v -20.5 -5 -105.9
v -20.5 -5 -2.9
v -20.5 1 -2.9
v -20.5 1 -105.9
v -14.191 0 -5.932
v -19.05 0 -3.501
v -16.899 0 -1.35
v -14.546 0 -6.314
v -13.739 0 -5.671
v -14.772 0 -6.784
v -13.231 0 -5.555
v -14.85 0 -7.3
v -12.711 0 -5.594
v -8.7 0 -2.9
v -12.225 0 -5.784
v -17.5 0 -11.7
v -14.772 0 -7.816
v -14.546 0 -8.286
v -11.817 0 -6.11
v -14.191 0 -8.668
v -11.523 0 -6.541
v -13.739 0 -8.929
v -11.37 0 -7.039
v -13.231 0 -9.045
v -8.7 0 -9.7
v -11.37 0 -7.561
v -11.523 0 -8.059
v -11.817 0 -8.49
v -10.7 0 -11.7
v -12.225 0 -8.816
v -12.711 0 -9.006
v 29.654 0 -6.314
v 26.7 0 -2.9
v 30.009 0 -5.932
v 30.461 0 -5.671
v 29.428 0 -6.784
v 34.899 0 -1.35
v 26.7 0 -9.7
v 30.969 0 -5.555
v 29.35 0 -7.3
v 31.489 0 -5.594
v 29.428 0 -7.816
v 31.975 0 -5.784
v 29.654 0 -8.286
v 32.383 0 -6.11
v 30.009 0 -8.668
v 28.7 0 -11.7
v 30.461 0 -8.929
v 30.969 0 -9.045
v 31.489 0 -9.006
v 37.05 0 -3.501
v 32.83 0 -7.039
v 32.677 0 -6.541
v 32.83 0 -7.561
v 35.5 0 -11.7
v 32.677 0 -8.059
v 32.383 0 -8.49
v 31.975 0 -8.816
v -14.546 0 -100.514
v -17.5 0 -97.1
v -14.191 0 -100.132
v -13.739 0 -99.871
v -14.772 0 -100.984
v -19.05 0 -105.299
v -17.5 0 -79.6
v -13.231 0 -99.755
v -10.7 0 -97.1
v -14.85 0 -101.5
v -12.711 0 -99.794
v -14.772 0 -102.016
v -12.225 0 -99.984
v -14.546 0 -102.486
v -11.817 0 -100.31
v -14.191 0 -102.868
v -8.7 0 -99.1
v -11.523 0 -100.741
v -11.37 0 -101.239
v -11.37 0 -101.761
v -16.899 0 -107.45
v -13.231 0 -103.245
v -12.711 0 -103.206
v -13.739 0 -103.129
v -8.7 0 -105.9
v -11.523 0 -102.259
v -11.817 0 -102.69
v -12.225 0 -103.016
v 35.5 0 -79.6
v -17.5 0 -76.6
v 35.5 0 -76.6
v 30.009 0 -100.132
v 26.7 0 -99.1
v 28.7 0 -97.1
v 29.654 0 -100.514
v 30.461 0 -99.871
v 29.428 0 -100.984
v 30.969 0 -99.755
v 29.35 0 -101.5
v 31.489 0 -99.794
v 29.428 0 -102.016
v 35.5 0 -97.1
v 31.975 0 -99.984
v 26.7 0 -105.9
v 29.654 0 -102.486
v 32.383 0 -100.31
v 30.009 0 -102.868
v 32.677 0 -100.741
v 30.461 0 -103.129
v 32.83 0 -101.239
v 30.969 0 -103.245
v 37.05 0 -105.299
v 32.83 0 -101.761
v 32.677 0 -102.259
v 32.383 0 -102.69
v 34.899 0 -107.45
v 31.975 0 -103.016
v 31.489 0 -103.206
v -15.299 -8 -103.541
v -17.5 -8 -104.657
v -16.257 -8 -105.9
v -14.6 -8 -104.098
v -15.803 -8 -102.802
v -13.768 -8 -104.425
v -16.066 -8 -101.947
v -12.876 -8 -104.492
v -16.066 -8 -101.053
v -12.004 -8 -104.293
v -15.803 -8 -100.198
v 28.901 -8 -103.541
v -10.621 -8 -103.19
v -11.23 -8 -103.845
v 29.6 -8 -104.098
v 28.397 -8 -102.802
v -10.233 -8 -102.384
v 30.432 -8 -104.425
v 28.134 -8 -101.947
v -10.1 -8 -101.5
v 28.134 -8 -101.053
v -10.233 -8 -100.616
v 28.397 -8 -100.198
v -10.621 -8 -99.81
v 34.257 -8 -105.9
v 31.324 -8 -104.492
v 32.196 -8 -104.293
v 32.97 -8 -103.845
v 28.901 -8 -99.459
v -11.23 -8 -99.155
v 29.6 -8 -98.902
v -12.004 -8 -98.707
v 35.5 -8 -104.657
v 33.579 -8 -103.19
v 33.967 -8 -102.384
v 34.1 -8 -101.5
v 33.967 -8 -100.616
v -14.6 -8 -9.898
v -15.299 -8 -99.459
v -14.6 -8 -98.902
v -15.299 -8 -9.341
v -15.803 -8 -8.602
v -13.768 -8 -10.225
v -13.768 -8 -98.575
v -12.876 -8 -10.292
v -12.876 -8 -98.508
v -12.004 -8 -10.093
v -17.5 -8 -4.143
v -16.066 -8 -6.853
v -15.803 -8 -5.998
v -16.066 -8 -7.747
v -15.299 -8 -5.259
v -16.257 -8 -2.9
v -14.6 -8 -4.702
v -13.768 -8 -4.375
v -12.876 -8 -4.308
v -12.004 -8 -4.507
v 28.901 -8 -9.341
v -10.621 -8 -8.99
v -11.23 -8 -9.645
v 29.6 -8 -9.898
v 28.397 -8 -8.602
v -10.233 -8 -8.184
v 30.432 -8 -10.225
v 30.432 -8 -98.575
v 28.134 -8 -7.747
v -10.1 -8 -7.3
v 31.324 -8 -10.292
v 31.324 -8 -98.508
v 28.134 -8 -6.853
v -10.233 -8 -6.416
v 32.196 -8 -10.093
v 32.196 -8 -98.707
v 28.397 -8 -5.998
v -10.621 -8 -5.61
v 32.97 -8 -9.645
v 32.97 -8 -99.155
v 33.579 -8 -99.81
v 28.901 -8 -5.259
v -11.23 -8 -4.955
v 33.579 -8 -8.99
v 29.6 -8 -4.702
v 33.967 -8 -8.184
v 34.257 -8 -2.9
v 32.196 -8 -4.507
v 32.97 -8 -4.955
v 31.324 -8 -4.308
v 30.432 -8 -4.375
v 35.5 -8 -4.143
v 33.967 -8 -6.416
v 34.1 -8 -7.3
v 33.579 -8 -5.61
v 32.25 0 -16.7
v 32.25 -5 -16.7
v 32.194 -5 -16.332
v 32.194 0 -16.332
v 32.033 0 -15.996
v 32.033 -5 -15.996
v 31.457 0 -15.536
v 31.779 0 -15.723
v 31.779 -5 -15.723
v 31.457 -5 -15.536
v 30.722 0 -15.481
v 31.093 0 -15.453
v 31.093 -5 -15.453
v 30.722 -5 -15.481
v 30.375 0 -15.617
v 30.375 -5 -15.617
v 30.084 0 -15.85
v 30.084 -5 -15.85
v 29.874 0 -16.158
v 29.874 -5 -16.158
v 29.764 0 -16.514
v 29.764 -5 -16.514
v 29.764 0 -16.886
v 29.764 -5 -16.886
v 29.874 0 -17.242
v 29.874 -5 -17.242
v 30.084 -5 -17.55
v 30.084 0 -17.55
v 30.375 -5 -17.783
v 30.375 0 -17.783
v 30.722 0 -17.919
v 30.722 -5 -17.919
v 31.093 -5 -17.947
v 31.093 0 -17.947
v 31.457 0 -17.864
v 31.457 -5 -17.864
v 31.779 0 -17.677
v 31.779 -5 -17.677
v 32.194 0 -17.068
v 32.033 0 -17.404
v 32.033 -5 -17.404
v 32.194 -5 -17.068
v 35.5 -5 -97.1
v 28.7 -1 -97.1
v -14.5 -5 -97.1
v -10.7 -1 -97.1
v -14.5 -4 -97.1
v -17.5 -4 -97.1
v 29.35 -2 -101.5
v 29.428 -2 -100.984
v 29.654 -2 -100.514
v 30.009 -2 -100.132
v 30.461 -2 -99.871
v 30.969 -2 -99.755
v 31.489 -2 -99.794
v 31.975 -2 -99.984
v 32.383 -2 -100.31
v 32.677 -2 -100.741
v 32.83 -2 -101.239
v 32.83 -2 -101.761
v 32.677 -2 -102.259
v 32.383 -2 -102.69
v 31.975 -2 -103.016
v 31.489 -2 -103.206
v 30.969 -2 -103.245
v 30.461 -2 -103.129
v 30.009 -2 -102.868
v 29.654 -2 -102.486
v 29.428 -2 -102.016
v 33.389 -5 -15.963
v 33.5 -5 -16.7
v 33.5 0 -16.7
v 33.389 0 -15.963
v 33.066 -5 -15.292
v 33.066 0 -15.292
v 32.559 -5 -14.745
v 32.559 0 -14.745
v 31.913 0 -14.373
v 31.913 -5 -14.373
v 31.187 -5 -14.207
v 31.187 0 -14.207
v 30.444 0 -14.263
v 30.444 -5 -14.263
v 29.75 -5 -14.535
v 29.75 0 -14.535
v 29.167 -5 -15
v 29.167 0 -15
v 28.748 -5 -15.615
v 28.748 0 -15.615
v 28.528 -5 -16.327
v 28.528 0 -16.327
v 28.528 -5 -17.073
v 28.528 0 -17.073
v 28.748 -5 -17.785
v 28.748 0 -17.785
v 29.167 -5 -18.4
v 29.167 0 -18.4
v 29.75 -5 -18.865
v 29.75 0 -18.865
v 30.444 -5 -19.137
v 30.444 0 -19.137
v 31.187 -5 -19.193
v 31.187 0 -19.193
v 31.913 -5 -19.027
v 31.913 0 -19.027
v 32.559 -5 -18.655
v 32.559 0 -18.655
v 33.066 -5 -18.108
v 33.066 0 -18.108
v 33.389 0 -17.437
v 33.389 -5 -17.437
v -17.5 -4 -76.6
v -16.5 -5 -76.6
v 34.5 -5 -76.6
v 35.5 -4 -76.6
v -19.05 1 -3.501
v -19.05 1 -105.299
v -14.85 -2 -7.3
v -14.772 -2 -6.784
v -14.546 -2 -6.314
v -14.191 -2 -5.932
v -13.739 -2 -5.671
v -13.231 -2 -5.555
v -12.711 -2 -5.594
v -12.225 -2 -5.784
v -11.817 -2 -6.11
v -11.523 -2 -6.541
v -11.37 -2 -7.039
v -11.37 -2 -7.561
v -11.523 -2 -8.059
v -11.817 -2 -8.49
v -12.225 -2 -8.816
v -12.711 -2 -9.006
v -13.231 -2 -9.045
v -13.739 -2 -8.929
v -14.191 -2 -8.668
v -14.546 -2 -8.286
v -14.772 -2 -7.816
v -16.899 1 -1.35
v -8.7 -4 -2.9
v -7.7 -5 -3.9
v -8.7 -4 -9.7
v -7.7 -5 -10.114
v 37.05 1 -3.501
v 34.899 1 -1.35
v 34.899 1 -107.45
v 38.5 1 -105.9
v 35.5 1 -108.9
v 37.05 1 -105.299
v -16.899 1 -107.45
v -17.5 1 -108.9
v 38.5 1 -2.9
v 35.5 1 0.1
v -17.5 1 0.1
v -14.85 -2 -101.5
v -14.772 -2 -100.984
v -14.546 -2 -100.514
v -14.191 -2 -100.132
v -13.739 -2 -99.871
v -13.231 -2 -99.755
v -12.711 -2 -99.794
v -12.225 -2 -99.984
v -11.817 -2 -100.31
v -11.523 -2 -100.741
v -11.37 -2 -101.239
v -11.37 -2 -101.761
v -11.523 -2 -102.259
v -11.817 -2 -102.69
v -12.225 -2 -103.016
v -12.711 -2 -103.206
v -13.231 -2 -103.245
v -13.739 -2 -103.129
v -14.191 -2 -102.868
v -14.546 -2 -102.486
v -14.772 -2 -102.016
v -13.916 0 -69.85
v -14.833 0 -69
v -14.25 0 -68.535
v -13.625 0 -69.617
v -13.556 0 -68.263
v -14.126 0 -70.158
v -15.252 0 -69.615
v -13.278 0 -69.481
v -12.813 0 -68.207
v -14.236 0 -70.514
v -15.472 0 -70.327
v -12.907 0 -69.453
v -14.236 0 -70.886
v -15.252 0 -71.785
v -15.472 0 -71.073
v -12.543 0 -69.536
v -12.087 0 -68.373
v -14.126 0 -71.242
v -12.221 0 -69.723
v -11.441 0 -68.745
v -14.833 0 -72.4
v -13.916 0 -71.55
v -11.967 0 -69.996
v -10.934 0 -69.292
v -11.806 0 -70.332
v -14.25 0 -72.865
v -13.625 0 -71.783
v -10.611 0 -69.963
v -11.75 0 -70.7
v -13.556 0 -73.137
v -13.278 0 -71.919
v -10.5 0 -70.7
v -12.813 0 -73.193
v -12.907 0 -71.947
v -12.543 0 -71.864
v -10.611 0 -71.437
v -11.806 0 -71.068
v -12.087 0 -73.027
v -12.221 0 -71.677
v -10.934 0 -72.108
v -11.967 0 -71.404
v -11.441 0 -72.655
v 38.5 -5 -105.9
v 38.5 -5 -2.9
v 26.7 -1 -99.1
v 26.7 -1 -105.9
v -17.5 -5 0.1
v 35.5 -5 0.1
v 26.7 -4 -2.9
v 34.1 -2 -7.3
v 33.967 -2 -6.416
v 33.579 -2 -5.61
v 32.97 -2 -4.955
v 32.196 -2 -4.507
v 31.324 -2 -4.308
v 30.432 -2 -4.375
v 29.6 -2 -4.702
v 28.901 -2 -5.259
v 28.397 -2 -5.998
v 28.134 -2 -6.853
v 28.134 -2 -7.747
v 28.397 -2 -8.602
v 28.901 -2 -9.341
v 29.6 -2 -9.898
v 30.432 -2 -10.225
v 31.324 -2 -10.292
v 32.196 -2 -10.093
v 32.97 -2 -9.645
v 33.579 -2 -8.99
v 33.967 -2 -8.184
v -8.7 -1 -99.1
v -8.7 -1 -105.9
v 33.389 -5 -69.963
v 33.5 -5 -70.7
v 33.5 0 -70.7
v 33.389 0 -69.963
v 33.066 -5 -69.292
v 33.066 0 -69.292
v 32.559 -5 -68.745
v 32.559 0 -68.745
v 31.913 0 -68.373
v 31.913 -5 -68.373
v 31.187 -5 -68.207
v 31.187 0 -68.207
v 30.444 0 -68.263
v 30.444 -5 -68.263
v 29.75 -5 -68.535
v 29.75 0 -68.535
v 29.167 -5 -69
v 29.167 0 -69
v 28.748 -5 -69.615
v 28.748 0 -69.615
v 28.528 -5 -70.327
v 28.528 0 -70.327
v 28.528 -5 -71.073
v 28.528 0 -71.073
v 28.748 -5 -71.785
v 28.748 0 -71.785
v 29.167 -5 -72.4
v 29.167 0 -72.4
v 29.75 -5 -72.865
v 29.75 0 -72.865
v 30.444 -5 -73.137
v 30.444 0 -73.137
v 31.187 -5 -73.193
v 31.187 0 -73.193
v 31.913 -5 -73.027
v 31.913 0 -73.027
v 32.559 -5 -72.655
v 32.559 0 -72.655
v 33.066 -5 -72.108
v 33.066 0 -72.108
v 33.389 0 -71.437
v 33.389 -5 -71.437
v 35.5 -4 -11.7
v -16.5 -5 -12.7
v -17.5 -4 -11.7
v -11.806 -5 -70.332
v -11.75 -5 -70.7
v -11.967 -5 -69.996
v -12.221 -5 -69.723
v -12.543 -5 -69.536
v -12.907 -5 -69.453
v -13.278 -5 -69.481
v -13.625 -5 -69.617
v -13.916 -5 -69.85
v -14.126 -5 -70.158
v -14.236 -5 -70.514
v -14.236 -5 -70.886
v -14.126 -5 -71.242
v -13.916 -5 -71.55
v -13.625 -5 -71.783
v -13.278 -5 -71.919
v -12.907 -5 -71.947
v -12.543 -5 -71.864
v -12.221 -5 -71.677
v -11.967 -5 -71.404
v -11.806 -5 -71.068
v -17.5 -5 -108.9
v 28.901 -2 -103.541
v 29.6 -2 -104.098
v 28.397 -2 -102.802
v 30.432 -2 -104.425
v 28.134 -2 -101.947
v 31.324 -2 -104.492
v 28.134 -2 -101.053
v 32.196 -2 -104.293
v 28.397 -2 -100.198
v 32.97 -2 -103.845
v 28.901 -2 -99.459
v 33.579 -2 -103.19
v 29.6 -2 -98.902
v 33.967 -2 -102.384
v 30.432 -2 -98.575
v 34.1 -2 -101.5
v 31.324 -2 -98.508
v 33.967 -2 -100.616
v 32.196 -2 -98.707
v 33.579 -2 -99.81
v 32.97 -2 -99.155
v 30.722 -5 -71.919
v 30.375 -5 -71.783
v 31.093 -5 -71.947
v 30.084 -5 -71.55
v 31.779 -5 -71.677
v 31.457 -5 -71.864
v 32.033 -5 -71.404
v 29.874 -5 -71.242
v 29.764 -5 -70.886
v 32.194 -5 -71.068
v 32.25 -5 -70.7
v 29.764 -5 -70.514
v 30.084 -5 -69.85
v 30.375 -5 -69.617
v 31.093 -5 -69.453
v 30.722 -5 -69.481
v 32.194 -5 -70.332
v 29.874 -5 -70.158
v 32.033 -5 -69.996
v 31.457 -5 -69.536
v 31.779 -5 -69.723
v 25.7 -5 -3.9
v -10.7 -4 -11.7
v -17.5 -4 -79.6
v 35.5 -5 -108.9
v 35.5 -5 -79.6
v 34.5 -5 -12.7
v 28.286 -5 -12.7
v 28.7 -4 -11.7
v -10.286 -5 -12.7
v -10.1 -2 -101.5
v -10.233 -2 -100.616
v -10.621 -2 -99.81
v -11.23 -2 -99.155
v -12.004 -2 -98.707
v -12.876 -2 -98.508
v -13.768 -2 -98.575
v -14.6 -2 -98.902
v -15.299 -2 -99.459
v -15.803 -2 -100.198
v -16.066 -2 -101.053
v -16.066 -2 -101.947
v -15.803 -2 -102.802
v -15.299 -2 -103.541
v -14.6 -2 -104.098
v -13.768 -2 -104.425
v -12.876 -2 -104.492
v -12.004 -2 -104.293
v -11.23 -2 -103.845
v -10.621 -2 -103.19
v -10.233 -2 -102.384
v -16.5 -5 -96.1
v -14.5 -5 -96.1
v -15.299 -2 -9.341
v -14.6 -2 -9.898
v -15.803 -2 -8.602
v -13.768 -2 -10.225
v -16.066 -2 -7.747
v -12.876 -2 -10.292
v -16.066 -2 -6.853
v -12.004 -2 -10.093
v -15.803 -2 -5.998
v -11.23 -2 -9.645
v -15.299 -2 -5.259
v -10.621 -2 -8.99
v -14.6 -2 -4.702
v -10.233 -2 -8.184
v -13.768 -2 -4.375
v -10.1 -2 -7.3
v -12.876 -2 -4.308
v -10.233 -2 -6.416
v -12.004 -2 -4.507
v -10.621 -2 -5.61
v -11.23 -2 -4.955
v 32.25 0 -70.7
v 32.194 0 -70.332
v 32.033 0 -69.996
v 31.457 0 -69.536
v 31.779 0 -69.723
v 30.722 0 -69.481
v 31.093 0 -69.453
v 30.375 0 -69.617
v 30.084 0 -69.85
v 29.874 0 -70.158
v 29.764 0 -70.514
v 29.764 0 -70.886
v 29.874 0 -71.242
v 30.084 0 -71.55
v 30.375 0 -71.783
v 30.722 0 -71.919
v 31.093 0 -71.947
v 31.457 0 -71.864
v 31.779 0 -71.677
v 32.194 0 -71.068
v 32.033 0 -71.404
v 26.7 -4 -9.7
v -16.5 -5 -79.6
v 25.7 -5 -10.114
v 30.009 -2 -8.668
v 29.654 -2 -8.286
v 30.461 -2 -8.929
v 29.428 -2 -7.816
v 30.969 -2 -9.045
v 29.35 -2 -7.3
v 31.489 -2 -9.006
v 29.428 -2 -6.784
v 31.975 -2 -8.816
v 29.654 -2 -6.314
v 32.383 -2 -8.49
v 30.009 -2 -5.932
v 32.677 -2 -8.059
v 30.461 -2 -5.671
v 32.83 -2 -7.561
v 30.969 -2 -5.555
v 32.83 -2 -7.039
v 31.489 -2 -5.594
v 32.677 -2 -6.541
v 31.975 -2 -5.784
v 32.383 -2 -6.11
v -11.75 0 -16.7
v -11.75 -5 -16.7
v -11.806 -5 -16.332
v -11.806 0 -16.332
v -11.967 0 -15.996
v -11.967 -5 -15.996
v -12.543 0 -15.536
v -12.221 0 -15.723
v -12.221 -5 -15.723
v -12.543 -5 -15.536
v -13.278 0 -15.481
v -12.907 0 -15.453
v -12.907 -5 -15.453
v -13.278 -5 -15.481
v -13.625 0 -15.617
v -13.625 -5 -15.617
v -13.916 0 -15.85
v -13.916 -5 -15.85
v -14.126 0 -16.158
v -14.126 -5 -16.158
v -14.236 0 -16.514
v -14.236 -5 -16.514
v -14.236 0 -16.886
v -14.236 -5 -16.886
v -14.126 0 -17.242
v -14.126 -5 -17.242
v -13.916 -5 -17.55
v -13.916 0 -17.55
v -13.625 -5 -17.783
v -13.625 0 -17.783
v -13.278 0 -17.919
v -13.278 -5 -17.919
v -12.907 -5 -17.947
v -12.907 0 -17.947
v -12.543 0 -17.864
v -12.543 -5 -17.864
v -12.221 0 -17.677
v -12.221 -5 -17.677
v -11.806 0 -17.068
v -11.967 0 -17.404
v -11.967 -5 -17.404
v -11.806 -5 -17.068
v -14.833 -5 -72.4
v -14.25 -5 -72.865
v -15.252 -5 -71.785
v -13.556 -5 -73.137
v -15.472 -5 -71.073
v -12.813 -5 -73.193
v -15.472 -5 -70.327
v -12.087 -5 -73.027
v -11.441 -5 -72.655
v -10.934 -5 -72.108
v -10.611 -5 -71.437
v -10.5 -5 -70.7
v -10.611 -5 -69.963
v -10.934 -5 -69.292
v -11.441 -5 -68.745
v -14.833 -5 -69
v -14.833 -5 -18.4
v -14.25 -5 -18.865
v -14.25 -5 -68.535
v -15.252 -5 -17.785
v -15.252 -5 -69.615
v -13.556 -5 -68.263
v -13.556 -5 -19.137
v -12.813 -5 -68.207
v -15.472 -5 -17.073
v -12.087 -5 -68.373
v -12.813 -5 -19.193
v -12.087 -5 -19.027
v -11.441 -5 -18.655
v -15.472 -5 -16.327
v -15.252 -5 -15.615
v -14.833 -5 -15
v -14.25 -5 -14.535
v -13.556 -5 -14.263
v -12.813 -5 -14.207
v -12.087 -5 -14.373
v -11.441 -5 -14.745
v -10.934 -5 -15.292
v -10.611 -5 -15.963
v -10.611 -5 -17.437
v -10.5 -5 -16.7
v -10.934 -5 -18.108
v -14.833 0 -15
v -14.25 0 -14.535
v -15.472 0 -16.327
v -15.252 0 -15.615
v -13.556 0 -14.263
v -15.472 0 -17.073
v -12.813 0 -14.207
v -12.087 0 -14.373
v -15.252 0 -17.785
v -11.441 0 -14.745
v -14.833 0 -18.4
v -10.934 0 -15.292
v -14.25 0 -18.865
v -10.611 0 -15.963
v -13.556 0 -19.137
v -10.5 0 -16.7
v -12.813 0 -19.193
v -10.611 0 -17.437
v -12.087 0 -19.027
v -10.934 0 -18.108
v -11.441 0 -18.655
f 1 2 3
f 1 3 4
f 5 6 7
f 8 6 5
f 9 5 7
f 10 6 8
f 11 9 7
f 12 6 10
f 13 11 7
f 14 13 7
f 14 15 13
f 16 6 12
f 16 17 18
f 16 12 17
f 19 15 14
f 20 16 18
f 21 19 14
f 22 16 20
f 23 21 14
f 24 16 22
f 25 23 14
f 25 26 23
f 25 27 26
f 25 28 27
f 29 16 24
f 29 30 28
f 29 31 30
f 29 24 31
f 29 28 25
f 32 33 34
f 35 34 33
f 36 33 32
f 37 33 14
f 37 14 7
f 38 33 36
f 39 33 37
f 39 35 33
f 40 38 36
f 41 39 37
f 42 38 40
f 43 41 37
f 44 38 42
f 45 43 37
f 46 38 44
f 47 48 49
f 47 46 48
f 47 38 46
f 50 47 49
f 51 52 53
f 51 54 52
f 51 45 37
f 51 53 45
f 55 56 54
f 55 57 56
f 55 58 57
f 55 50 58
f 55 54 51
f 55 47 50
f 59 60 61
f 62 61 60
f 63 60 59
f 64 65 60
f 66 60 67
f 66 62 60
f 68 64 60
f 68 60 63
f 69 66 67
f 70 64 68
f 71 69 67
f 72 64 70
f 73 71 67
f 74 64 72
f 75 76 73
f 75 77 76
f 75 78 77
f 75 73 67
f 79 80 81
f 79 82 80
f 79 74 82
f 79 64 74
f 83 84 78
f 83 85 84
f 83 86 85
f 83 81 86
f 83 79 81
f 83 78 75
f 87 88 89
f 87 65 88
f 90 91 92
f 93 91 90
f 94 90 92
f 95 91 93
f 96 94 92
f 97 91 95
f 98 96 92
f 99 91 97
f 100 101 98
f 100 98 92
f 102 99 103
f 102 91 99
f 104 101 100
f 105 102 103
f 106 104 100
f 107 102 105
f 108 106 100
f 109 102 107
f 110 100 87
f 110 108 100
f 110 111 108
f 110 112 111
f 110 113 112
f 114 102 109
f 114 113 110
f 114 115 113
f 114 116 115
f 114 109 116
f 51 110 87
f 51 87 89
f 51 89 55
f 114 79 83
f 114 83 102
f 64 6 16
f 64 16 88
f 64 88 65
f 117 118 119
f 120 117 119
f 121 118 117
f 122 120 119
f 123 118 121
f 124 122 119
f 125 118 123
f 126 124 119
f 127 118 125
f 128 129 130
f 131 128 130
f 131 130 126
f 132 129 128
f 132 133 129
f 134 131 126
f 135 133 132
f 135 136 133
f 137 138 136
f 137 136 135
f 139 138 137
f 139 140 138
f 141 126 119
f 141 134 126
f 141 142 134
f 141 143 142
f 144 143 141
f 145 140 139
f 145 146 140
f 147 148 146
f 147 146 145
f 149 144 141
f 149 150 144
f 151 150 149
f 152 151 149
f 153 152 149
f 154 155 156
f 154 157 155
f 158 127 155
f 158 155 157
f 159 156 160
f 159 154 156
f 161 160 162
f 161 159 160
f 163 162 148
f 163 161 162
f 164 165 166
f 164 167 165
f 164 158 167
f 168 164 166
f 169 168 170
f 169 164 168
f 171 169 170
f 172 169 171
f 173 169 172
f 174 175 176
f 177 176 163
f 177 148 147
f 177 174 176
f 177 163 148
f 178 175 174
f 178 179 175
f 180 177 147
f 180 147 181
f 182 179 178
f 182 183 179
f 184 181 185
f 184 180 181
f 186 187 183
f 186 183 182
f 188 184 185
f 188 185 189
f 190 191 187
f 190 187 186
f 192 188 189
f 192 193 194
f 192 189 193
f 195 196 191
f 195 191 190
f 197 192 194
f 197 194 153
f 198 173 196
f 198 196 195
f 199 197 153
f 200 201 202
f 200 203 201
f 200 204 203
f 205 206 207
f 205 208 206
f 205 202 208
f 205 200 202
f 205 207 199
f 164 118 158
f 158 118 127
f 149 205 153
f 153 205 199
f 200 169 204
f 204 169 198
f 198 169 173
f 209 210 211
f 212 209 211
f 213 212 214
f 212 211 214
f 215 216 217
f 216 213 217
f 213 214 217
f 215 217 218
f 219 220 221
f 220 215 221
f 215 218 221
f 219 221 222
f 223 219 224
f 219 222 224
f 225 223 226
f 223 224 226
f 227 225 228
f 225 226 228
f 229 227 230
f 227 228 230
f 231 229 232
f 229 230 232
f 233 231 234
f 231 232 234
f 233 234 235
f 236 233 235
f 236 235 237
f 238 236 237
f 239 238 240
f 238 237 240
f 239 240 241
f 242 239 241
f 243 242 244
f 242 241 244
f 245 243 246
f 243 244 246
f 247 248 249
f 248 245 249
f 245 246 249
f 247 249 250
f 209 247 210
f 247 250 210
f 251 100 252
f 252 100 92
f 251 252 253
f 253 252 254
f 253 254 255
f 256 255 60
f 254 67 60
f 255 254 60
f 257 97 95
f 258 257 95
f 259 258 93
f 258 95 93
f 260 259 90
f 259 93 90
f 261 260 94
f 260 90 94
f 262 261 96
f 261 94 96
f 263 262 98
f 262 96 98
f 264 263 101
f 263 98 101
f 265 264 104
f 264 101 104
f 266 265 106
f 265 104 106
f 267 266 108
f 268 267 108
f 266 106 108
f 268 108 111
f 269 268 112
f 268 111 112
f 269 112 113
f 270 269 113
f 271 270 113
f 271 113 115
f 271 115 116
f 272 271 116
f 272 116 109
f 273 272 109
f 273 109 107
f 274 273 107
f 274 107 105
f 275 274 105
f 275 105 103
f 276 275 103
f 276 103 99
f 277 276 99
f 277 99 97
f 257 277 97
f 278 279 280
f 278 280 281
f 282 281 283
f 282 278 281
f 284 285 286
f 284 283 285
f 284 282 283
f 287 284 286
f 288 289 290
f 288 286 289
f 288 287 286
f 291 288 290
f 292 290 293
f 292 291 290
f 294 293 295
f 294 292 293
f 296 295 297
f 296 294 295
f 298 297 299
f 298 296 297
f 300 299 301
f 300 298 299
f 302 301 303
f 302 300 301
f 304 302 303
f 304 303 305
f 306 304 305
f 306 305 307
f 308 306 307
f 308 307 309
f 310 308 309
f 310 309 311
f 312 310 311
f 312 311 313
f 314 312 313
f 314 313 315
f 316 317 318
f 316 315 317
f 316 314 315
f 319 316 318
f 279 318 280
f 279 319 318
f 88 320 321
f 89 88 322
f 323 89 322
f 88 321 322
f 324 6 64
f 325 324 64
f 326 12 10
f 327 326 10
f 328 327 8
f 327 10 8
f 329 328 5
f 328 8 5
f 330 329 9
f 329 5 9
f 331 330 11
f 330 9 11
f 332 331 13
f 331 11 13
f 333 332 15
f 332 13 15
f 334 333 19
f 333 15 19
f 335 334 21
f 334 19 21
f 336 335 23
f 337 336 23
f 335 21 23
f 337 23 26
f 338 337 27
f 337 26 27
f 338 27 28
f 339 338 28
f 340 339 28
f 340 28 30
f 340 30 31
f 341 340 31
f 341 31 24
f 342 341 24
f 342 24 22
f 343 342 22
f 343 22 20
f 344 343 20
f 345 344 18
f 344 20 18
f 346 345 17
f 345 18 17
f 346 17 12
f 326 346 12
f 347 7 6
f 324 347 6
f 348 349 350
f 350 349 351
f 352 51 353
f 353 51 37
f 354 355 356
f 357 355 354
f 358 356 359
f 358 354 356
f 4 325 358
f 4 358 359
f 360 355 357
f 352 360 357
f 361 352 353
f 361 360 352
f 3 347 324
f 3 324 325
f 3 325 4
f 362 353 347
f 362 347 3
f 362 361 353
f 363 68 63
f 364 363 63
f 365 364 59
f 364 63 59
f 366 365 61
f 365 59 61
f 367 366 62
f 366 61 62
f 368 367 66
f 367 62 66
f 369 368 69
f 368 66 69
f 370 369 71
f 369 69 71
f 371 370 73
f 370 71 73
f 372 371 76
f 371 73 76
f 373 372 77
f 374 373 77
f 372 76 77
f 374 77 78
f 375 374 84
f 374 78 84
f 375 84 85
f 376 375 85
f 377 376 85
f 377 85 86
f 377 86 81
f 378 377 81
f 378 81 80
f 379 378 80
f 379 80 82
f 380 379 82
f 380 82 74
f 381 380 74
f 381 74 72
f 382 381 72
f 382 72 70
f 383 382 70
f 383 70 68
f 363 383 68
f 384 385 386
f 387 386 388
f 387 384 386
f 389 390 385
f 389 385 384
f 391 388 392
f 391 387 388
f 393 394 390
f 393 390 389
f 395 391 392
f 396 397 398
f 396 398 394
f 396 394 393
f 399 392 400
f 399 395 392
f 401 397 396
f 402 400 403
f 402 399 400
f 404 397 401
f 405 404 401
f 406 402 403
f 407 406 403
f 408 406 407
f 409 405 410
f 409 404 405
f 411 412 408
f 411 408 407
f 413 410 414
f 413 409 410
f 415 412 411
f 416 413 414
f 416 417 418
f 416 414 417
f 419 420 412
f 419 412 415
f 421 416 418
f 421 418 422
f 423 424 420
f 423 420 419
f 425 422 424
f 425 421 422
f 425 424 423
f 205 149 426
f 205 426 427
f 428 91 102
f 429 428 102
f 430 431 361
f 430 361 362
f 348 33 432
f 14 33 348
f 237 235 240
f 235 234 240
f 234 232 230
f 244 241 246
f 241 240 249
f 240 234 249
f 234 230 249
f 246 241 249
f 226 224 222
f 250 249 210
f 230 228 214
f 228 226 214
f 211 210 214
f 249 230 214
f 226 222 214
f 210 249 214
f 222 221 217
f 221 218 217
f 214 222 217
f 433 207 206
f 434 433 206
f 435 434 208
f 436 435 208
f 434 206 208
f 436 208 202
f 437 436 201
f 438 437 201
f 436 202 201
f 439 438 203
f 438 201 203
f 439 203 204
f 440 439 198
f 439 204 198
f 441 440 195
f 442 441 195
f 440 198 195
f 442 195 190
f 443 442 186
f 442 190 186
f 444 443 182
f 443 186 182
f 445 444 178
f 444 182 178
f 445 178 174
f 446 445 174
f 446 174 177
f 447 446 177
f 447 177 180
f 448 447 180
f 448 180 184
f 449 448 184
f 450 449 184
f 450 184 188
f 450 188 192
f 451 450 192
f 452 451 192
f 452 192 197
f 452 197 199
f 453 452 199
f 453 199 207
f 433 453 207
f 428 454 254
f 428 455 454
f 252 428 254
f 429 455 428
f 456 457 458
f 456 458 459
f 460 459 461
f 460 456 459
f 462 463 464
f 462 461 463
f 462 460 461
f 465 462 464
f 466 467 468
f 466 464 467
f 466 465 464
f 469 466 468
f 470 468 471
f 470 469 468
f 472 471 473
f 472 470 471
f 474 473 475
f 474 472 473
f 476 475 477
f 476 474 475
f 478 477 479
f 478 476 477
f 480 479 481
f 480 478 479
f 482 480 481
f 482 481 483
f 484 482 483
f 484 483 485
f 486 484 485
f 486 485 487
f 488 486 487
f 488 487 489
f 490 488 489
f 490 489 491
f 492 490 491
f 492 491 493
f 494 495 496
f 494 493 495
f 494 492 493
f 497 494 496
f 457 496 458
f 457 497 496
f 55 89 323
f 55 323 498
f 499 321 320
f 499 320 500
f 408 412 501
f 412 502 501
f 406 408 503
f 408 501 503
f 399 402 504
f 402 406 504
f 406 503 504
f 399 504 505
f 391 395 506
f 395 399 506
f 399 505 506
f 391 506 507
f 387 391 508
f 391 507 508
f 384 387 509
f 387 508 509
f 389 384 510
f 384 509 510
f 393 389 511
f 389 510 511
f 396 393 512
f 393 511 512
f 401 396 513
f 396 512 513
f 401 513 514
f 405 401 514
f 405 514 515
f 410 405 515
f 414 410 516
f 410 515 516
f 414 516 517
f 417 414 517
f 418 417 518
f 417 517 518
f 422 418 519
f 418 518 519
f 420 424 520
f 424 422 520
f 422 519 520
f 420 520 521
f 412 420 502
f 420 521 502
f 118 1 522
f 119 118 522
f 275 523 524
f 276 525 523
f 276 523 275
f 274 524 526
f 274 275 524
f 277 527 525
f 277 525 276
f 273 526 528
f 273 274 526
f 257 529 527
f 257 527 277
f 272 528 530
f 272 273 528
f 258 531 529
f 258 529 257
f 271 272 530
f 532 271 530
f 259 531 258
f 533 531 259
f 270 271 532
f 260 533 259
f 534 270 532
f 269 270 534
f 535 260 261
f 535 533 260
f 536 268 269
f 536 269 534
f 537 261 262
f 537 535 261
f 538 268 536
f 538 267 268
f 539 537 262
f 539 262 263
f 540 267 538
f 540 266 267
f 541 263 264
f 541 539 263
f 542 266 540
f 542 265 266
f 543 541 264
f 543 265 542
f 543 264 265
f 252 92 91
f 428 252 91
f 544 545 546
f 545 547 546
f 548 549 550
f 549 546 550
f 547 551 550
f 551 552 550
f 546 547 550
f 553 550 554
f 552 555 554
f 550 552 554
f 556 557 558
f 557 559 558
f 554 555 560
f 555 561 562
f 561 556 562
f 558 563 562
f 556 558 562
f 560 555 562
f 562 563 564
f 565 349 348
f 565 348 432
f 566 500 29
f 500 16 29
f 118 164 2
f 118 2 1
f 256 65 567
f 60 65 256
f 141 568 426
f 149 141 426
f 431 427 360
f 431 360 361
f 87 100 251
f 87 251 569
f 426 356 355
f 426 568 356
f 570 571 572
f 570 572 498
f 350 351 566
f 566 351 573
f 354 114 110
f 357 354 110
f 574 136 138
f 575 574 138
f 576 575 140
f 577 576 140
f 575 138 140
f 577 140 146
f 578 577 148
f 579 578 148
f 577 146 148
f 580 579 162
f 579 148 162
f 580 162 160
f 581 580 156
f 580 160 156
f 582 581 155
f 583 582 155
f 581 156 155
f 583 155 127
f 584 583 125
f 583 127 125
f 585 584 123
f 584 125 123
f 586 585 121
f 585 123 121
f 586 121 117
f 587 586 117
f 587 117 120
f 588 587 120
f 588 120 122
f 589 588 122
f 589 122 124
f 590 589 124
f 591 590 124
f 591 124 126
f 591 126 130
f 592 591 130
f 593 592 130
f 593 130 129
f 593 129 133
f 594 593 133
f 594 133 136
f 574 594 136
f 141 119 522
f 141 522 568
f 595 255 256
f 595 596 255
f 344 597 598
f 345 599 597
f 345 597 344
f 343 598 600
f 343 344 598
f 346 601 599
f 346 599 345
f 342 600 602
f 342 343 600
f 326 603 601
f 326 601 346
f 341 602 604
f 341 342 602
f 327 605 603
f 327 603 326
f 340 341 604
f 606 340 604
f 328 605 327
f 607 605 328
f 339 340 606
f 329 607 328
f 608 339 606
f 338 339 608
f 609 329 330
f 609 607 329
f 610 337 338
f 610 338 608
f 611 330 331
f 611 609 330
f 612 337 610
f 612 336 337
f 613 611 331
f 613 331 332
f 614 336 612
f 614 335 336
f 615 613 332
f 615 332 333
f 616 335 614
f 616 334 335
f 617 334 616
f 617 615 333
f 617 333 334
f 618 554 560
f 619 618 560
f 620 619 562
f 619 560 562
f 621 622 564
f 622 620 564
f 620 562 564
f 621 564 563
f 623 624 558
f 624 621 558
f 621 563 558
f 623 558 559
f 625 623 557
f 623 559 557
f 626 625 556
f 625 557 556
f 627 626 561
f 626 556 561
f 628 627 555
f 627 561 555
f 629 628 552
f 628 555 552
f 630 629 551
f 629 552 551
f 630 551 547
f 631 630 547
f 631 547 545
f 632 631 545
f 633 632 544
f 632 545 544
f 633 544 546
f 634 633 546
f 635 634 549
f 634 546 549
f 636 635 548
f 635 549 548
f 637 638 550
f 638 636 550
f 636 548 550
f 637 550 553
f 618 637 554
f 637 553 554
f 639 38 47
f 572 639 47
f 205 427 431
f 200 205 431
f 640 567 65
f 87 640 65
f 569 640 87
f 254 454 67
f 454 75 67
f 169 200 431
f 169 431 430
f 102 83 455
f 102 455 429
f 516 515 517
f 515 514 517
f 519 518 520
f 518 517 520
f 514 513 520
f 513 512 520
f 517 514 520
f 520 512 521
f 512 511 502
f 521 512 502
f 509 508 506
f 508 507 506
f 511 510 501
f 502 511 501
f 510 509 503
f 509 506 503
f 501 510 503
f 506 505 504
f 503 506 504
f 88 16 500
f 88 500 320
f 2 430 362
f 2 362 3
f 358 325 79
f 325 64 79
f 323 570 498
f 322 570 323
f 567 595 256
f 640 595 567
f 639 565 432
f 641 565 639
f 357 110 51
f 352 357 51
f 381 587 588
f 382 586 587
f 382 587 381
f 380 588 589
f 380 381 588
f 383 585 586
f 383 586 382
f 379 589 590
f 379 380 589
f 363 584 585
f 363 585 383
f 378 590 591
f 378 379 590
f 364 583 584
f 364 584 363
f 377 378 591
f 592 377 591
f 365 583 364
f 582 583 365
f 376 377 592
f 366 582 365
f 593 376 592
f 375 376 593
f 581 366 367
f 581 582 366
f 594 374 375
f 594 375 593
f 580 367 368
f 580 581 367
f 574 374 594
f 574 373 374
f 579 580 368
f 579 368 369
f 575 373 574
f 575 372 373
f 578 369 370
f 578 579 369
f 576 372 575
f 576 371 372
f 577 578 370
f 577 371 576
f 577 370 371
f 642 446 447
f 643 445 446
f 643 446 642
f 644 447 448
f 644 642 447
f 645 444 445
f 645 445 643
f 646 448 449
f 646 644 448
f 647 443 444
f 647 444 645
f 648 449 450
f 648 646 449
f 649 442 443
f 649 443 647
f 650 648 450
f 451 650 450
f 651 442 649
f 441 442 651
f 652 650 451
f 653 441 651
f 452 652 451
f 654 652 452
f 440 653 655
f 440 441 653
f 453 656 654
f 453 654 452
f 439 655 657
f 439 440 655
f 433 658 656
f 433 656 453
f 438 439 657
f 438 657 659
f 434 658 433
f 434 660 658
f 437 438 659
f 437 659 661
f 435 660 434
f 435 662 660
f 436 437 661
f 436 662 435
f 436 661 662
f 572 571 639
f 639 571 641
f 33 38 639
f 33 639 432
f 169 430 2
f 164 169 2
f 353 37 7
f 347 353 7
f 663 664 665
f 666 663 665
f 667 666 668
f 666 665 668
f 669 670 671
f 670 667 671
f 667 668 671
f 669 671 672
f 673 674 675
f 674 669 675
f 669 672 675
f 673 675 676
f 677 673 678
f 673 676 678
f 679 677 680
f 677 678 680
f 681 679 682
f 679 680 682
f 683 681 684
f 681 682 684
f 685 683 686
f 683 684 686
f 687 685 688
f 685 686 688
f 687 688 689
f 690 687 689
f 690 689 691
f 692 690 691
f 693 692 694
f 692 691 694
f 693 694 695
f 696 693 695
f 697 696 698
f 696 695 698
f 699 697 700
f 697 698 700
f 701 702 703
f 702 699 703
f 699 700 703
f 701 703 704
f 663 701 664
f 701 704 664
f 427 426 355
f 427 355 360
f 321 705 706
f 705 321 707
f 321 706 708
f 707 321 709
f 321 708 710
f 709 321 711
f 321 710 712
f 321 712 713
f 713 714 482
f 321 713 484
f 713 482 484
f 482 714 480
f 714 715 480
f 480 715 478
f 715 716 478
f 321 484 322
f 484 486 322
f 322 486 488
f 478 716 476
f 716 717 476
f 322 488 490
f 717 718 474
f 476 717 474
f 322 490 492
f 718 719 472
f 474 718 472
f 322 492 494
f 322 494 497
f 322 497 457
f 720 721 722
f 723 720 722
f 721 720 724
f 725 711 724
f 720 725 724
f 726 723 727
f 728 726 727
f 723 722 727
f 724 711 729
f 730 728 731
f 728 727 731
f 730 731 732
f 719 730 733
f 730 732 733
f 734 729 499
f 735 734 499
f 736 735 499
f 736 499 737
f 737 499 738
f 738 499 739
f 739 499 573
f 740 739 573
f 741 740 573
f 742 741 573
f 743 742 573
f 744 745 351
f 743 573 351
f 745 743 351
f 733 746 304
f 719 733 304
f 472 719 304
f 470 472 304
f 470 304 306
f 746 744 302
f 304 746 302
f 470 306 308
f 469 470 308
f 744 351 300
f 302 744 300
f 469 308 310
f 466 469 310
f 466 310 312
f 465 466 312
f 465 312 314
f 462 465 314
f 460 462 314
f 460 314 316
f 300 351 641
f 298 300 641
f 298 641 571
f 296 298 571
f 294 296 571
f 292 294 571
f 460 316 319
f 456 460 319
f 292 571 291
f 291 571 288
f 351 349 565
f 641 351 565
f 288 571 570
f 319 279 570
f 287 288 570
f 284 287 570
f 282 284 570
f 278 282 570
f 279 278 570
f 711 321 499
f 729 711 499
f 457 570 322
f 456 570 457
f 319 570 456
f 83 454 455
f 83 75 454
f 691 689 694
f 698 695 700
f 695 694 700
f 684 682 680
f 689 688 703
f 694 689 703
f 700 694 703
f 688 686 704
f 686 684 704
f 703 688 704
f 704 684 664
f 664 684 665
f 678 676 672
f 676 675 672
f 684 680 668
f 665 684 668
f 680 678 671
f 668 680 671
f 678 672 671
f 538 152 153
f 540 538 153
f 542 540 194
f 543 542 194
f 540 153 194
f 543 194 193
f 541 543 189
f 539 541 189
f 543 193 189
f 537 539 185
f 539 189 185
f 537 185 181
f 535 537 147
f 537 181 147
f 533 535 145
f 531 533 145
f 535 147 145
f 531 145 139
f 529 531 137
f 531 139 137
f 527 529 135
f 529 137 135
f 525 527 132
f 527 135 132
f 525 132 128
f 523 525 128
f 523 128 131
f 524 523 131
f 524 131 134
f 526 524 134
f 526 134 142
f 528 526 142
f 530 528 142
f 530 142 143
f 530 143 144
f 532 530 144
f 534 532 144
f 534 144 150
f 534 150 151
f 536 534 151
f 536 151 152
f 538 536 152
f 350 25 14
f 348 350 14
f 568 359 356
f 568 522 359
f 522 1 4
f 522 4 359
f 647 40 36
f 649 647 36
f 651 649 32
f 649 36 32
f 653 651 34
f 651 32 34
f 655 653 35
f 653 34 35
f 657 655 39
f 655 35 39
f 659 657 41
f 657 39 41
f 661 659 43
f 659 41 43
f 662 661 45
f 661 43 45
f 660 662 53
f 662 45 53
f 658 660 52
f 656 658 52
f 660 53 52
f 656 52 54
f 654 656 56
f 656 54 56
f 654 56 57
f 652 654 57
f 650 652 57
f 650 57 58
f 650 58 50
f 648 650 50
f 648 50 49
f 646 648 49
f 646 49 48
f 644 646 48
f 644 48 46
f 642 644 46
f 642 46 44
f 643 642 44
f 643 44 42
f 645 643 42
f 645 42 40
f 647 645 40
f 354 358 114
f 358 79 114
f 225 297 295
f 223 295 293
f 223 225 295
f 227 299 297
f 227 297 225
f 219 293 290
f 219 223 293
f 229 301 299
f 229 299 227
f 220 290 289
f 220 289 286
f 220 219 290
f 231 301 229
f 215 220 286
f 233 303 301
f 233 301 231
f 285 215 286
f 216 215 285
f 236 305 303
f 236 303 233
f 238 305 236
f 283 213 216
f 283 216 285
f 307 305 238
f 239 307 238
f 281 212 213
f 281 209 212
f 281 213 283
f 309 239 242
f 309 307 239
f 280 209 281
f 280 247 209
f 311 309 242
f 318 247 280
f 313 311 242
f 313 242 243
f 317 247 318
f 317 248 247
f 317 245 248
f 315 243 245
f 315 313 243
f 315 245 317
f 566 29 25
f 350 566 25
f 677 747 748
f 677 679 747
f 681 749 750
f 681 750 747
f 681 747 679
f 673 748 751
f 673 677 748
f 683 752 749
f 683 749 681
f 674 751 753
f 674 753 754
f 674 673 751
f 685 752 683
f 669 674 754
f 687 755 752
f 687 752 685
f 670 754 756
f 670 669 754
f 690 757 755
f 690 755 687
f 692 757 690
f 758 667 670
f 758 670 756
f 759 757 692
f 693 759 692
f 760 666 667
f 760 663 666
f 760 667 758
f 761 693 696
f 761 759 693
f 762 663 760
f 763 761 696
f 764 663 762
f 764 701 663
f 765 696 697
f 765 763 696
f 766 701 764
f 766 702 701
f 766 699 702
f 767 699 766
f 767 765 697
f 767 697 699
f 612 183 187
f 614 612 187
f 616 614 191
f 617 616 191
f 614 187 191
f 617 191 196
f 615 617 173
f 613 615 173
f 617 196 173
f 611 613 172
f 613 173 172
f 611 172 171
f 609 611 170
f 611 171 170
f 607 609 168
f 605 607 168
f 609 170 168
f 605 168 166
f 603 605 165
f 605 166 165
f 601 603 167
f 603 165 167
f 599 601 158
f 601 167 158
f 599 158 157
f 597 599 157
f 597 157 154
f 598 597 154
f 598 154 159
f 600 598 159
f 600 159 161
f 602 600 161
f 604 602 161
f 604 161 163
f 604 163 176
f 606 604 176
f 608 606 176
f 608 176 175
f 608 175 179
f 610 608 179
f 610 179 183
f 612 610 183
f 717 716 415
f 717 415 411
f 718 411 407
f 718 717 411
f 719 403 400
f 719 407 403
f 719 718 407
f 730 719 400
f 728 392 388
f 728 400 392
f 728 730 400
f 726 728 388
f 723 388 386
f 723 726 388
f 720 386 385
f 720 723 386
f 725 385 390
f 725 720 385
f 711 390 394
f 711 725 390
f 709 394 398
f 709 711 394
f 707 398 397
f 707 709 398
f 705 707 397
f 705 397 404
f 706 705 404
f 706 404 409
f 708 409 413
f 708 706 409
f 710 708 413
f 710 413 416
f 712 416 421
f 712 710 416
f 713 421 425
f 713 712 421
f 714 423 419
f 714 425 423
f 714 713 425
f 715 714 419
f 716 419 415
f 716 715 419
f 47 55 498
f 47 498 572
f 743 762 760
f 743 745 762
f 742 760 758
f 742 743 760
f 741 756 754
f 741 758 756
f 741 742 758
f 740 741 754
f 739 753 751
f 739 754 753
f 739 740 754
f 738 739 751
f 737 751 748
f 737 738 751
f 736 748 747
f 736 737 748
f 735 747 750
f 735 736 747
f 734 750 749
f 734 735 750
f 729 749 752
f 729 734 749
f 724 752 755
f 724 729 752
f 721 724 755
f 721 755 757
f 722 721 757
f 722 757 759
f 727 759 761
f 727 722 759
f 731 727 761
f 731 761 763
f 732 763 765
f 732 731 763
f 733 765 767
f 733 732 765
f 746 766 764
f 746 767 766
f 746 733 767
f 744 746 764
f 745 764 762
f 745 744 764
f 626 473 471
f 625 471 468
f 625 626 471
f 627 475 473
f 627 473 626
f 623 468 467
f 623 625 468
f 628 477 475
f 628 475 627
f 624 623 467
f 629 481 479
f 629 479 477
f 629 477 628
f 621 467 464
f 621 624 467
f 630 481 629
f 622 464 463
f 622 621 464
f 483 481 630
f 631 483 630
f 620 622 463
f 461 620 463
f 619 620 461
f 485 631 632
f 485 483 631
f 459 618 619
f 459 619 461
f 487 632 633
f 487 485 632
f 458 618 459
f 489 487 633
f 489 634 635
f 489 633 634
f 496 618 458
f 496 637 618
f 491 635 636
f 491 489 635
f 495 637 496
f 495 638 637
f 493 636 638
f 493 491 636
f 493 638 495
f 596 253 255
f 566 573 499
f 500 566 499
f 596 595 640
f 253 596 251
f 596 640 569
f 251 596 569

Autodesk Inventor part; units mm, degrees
ref_plane "YZ Plane" through (0, 0, 0) normal (1, 0, 0) x (0, 1, 0)
ref_plane "XZ Plane" through (0, 0, 0) normal (0, 1, 0) x (-1, 0, 0)
ref_plane "XY Plane" through (0, 0, 0) normal (0, 0, 1) x (1, 0, 0)
sketch "Sketch4" plane through (0, 0, 0) normal (0, 1, 0) x (-1, 0, 0)
  circle A0 centre (-31.1, -7.3) radius 1.75
  line L0 (-34.858, -107.35) -> (16.858, -107.35)
  line L1 (16.858, -107.35) -> (18.95, -105.258)
  line L2 (18.95, -105.258) -> (18.95, -3.542)
  line L3 (18.95, -3.542) -> (16.858, -1.45)
  line L4 (16.858, -1.45) -> (-34.858, -1.45)
  line L5 (-34.858, -1.45) -> (-36.95, -3.542)
  line L6 (-36.95, -3.542) -> (-36.95, -105.258)
  line L7 (-36.95, -105.258) -> (-34.858, -107.35)
  circle A1 centre (-31.1, -101.5) radius 1.75
  circle A2 centre (13.1, -7.3) radius 1.75
  line L8 (8.7, -99.1) -> (10.7, -97.1)
  line L9 (8.7, -99.1) -> (8.7, -105.9)
  line L10 (8.7, -105.9) -> (-26.7, -105.9)
  line L11 (-26.7, -99.1) -> (-26.7, -105.9)
  line L12 (-28.7, -97.1) -> (-26.7, -99.1)
  line L13 (-35.5, -97.1) -> (-28.7, -97.1)
  line L14 (-35.5, -97.1) -> (-35.5, -11.7)
  line L15 (-35.5, -11.7) -> (-28.7, -11.7)
  line L16 (-26.7, -9.7) -> (-28.7, -11.7)
  line L17 (-26.7, -9.7) -> (-26.7, -2.9)
  line L18 (-26.7, -2.9) -> (8.7, -2.9)
  line L19 (8.7, -9.7) -> (8.7, -2.9)
  line L20 (10.7, -11.7) -> (8.7, -9.7)
  line L21 (17.5, -11.7) -> (10.7, -11.7)
  line L22 (17.5, -11.7) -> (17.5, -97.1)
  line L23 (17.5, -97.1) -> (10.7, -97.1)
  circle A3 centre (13.1, -101.5) radius 1.75
  line L24 (20.5, -2.9) -> (20.5, -105.9)
  line L25 (17.5, 0.1) -> (20.5, -2.9)
  line L26 (-35.5, 0.1) -> (17.5, 0.1)
  line L27 (-38.5, -2.9) -> (-35.5, 0.1)
  line L28 (-38.5, -105.9) -> (-38.5, -2.9)
  line L29 (-35.5, -108.9) -> (-38.5, -105.9)
  line L30 (17.5, -108.9) -> (-35.5, -108.9)
  line L31 (20.5, -105.9) -> (17.5, -108.9)
  line L32 (16.858, -107.35) -> (18.95, -105.258)
  line L33 (-34.858, -107.35) -> (16.858, -107.35)
  line L34 (-36.95, -105.258) -> (-34.858, -107.35)
  line L35 (-36.95, -3.542) -> (-36.95, -105.258)
  line L36 (-34.858, -1.45) -> (-36.95, -3.542)
  line L37 (16.858, -1.45) -> (-34.858, -1.45)
  line L38 (18.95, -3.542) -> (16.858, -1.45)
  line L39 (18.95, -105.258) -> (18.95, -3.542)
  line L40 (-37.05, -105.2994) -> (-37.05, -3.5006)
  line L41 (-37.05, -3.5006) -> (-34.8994, -1.35)
  line L42 (-34.8994, -1.35) -> (16.8994, -1.35)
  line L43 (16.8994, -1.35) -> (19.05, -3.5006)
  line L44 (19.05, -3.5006) -> (19.05, -105.2994)
  line L45 (19.05, -105.2994) -> (16.8994, -107.45)
  line L46 (16.8994, -107.45) -> (-34.8994, -107.45)
  line L47 (-34.8994, -107.45) -> (-37.05, -105.2994)
  point P0 (0, 0)
  point P1 (0, 0)
  dimension "d29" = 0.1
extrude "Extrusion3" add sketch "Sketch4" along normal blind 1 contours L24 L31 L30 L29 L28 L27 L26 L25
extrude "Extrusion4" add sketch "Sketch4" against normal blind 5 contours L7 L6 L5 L4 L3 L2 L1 L0 | L24 L31 L30 L29 L28 L27 L26 L25 | L40 L41 L42 L43 L44 L45 L46 L47
sketch "Sketch5" plane through (0, -5, 0) normal (0, -1, 0) x (1, 0, 0)
  line L0 (38.5, -105.9) -> (38.5, -2.9) projected
  line L1 (38.5, -2.9) -> (35.5, 0.1) projected
  line L2 (35.5, 0.1) -> (-17.5, 0.1) projected
  line L3 (35.5, 0.1) -> (-17.5, 0.1) projected
  line L4 (-17.5, 0.1) -> (-20.5, -2.9) projected
  line L5 (-20.5, -2.9) -> (-20.5, -105.9) projected
  line L6 (-20.5, -105.9) -> (-17.5, -108.9) projected
  line L7 (-17.5, -108.9) -> (35.5, -108.9) projected
  line L8 (35.5, -108.9) -> (38.5, -105.9) projected
  line L9 (38.5, -105.9) -> (38.5, -2.9) projected
  line L10 (38.5, -2.9) -> (35.5, 0.1) projected
  circle A0 centre (31.1, -101.5) radius 1.75 projected
  circle A1 centre (-13.1, -101.5) radius 1.75 projected
  circle A2 centre (31.1, -7.3) radius 1.75 projected
  circle A3 centre (-13.1, -7.3) radius 1.75 projected
  line L11 (-17.5, -11.7) -> (-10.7, -11.7) projected
  line L12 (-10.7, -11.7) -> (-8.7, -9.7) projected
  line L13 (-8.7, -9.7) -> (-8.7, -2.9) projected
  line L14 (-8.7, -2.9) -> (26.7, -2.9) projected
  line L15 (26.7, -2.9) -> (26.7, -9.7) projected
  line L16 (26.7, -9.7) -> (28.7, -11.7) projected
  line L17 (28.7, -11.7) -> (35.5, -11.7) projected
  line L18 (35.5, -11.7) -> (35.5, -97.1) projected
  line L19 (35.5, -97.1) -> (28.7, -97.1) projected
  line L20 (28.7, -97.1) -> (26.7, -99.1) projected
  line L21 (26.7, -99.1) -> (26.7, -105.9) projected
  line L22 (26.7, -105.9) -> (-8.7, -105.9) projected
  line L23 (-8.7, -105.9) -> (-8.7, -99.1) projected
  line L24 (-8.7, -99.1) -> (-10.7, -97.1) projected
  line L25 (-10.7, -97.1) -> (-17.5, -97.1) projected
  line L26 (-17.5, -97.1) -> (-17.5, -11.7) projected
  point P0 (0, 0)
extrude "Extrusion5" add sketch "Sketch5" along normal blind 3 contours L8 L7 L6 L5 L4 L2 L1 L0 | L11 L12 L13 L14 L15 L16 L17 L18 L19 L20 L21 L22 L23 L24 L25 L26
sketch "Sketch6" plane through (0, -8, 0) normal (0, -1, 0) x (1, 0, 0)
  line L0 (38.5, -2.9) -> (35.5, 0.1) projected
  line L1 (35.5, 0.1) -> (-17.5, 0.1) projected
  line L2 (-17.5, 0.1) -> (-20.5, -2.9) projected
  line L3 (-20.5, -2.9) -> (-20.5, -105.9) projected
  line L4 (-20.5, -105.9) -> (-17.5, -108.9) projected
  line L5 (-17.5, -108.9) -> (35.5, -108.9) projected
  line L6 (35.5, -108.9) -> (38.5, -105.9) projected
  line L7 (38.5, -105.9) -> (38.5, -2.9) projected
  circle A0 centre (31.1, -101.5) radius 1.75 projected
  circle A1 centre (-13.1, -101.5) radius 1.75 projected
  circle A2 centre (31.1, -7.3) radius 1.75 projected
  circle A3 centre (-13.1, -7.3) radius 1.75 projected
  circle A4 centre (31.1, -7.3) radius 3
  circle A5 centre (31.1, -101.5) radius 3
  circle A6 centre (-13.1, -101.5) radius 3
  circle A7 centre (-13.1, -7.3) radius 3
  point P0 (0, 0)
  dimension "d17" = 6
  dimension "d18" = 6
  dimension "d19" = 6
  dimension "d20" = 6
extrude "Extrusion6" cut sketch "Sketch6" against normal blind 6 contours A4 | A5 | A6 | A7
chamfer "Chamfer2" distance 1 angle 45 16 edges at (-17.5, -5, -54.4) (-9.7, -5, -98.1) (-8.7, -5, -102.5) (9, -5, -105.9) (26.7, -5, -102.5) (27.7, -5, -98.1) (35.5, -5, -54.4) (-14.1, -5, -11.7) (-9.7, -5, -10.7) (-8.7, -5, -6.3) (9, -5, -2.9) (26.7, -5, -6.3) (27.7, -5, -10.7) (32.1, -5, -11.7) (32.1, -5, -97.1) (-14.1, -5, -97.1)
chamfer "Chamfer3" distance 3 angle 45 8 edges at (38.5, -8, -54.4) (37, -8, -1.4) (9, -8, 0.1) (-19, -8, -1.4) (-20.5, -8, -54.4) (-19, -8, -107.4) (9, -8, -108.9) (37, -8, -107.4)
sketch "Sketch7" plane through (0, -5, 0) normal (0, 1, 0) x (1, 0, 0)
  line L0 (-13, 16.7) -> (31, 16.7) construction
  line L1 (31, 16.7) -> (31, 70.7) construction
  line L2 (31, 70.7) -> (-13, 70.7) construction
  line L3 (-13, 70.7) -> (-13, 16.7) construction
  circle A0 centre (-13, 70.7) radius 1.25
  circle A1 centre (31, 70.7) radius 1.25
  circle A2 centre (31, 16.7) radius 1.25
  circle A3 centre (-13, 16.7) radius 1.25
  line L4 (-13, 70.7) -> (31, 16.7) construction
  line L5 (-13, 16.7) -> (31, 70.7) construction
  line L6 (-16, 13.7) -> (34, 13.7) construction
  line L7 (34, 13.7) -> (34, 73.7) construction
  line L8 (34, 73.7) -> (-16, 73.7) construction
  line L9 (-16, 73.7) -> (-16, 13.7) construction
  line L10 (-16, 13.7) -> (34, 73.7) construction
  line L11 (34, 13.7) -> (-16, 73.7) construction
  line L12 (34.5, 96.1) -> (34.5, 12.7) construction
  line L13 (25.7, 98.6858) -> (28.2858, 96.1) construction
  line L14 (25.7, 104.9) -> (25.7, 98.6858) construction
  line L15 (-7.7, 104.9) -> (25.7, 104.9) construction
  line L16 (-7.7, 98.6858) -> (-7.7, 104.9) construction
  line L17 (-10.2858, 96.1) -> (-7.7, 98.6858) construction
  line L18 (-16.5, 12.7) -> (-16.5, 96.1) construction
  line L19 (-10.2858, 12.7) -> (-16.5, 12.7) construction
  line L20 (-7.7, 10.1142) -> (-10.2858, 12.7) construction
  line L21 (-7.7, 3.9) -> (-7.7, 10.1142) construction
  line L22 (25.7, 3.9) -> (-7.7, 3.9) construction
  line L23 (25.7, 10.1142) -> (25.7, 3.9) construction
  line L24 (28.2858, 12.7) -> (25.7, 10.1142) construction
  line L25 (34.5, 12.7) -> (28.2858, 12.7) construction
  line L26 (-7.7, 104.9) -> (25.7, 104.9) construction
  line L27 (9, 104.9) -> (9, 3.9) construction
  line L28 (25.7, 3.9) -> (-7.7, 3.9) construction
  circle A4 centre (-13, 70.7) radius 2.5
  circle A5 centre (31, 70.7) radius 2.5
  circle A6 centre (31, 16.7) radius 2.5
  circle A7 centre (-13, 16.7) radius 2.5
  line L29 (28.2858, 96.1) -> (34.5, 96.1) projected
  line L30 (-16.5, 96.1) -> (-10.2858, 96.1) projected
  point P0 (0, 0)
  point P1 (9, 43.7)
  point P2 (9, 43.7)
  dimension "d30" = 44
  dimension "d31" = 54
  dimension "d32" = 2.5
  dimension "d33" = 2.5
  dimension "d34" = 2.5
  dimension "d35" = 2.5
  dimension "d36" = 50
  dimension "d37" = 60
  dimension "d38" = 1
  dimension "d39" = 5
  dimension "d40" = 5
  dimension "d41" = 5
  dimension "d42" = 5
extrude "Extrusion7" add sketch "Sketch7" along normal blind 5
sketch "Sketch8" plane through (0, -5, 0) normal (0, 1, 0) x (1, 0, 0)
  line L0 (-14.5, 79.6) -> (35.5, 79.6)
  line L1 (35.5, 79.6) -> (35.5, 97.1)
  line L2 (35.5, 97.1) -> (-14.5, 97.1)
  line L3 (-14.5, 97.1) -> (-14.5, 79.6)
  line L4 (-14.5, 79.6) -> (35.5, 97.1) construction
  line L5 (35.5, 79.6) -> (-14.5, 97.1) construction
  circle A0 centre (31, 16.7) radius 2.5 projected
  circle A1 centre (31, 70.7) radius 2.5 projected
  circle A2 centre (-13, 16.7) radius 2.5 projected
  circle A3 centre (-13, 70.7) radius 2.5 projected
  line L6 (-16.5, 12.7) -> (-16.5, 96.1) projected
  line L7 (-10.2858, 12.7) -> (-16.5, 12.7) projected
  line L8 (-7.7, 10.1142) -> (-10.2858, 12.7) projected
  line L9 (-7.7, 3.9) -> (-7.7, 10.1142) projected
  line L10 (25.7, 3.9) -> (-7.7, 3.9) projected
  line L11 (25.7, 10.1142) -> (25.7, 3.9) projected
  line L12 (28.2858, 12.7) -> (25.7, 10.1142) projected
  line L13 (34.5, 12.7) -> (28.2858, 12.7) projected
  line L14 (34.5, 96.1) -> (34.5, 12.7) projected
  line L15 (25.7, 98.6858) -> (28.2858, 96.1) projected
  line L16 (25.7, 104.9) -> (25.7, 98.6858) projected
  line L17 (-7.7, 104.9) -> (25.7, 104.9) projected
  line L18 (-7.7, 98.6858) -> (-7.7, 104.9) projected
  line L19 (-10.2858, 96.1) -> (-7.7, 98.6858) projected
  line L20 (28.7, 97.1) -> (35.5, 97.1) projected
  line L21 (35.5, 97.1) -> (35.5, 11.7) projected
  line L22 (28.2858, 96.1) -> (34.5, 96.1) projected
  line L23 (-16.5, 96.1) -> (-10.2858, 96.1) projected
  line L24 (26.7, 105.9) -> (-8.7, 105.9) projected
  line L25 (-7.7, 104.9) -> (-8.7, 105.9) projected
  line L26 (-7.7, 104.9) -> (25.7, 104.9) projected
  line L27 (25.7, 104.9) -> (26.7, 105.9) projected
  line L28 (-8.7, 105.9) -> (-8.7, 99.1) projected
  line L29 (-7.7, 98.6858) -> (-8.7, 99.1) projected
  line L30 (-7.7, 98.6858) -> (-7.7, 104.9) projected
  line L31 (-7.7, 104.9) -> (-8.7, 105.9) projected
  line L32 (-8.7, 99.1) -> (-10.7, 97.1) projected
  line L33 (-10.2858, 96.1) -> (-10.7, 97.1) projected
  line L34 (-10.2858, 96.1) -> (-7.7, 98.6858) projected
  line L35 (-7.7, 98.6858) -> (-8.7, 99.1) projected
  line L36 (28.7, 97.1) -> (26.7, 99.1) projected
  line L37 (25.7, 98.6858) -> (26.7, 99.1) projected
  line L38 (25.7, 98.6858) -> (28.2858, 96.1) projected
  line L39 (28.2858, 96.1) -> (28.7, 97.1) projected
  line L40 (26.7, 99.1) -> (26.7, 105.9) projected
  line L41 (25.7, 104.9) -> (26.7, 105.9) projected
  line L42 (25.7, 104.9) -> (25.7, 98.6858) projected
  line L43 (25.7, 98.6858) -> (26.7, 99.1) projected
  point P0 (0, 0)
  point P1 (10.5, 88.35)
  point P2 (34.5, 97.1)
  point P3 (-9.2858, 97.1)
  point P4 (-14.5, 96.1)
  dimension "d47" = 50
  dimension "d48" = 17.5
extrude "Extrusion8" cut sketch "Sketch8" along normal blind 5 contours L3 L23 L19 L2 L15 L22 L14 L0 | L14 L22 L39 L2 L1 L0 | L3 L2 L33 L23 | L33 L2 L19 | L15 L2 L39
extrude "Extrusion9" add sketch "Sketch8" along normal blind 4 contours L32 L29 L19 L2 | L19 L18 L17 L16 L15 L2 | L2 L15 L37 L36 | L28 L25 L18 L29 | L37 L16 L27 L40 | L24 L27 L17 L25
sketch "Sketch9" plane through (0, -5, 0) normal (0, 1, 0) x (1, 0, 0)
  line L0 (34.5, 79.6) -> (35.5, 79.6) projected
  line L1 (-17.5, 97.1) -> (-17.5, 11.7) projected
  line L2 (35.5, 79.6) -> (-17.5, 79.6)
  line L3 (-17.5, 79.6) -> (-17.5, 76.6)
  line L4 (-17.5, 76.6) -> (35.5, 76.6)
  line L5 (35.5, 76.6) -> (35.5, 79.6)
  point P0 (0, 0)
  dimension "d53" = 3
extrude "Extrusion10" add sketch "Sketch9" along normal blind 5
equation "\"d18\" = d17"
equation "\"d19\" = d17"
equation "\"d20\" = d17"
equation "\"d33\" = d32"
equation "\"d34\" = d32"
equation "\"d35\" = d32"
equation "\"d43\" = d42"
properties part number "_3DPrint"
